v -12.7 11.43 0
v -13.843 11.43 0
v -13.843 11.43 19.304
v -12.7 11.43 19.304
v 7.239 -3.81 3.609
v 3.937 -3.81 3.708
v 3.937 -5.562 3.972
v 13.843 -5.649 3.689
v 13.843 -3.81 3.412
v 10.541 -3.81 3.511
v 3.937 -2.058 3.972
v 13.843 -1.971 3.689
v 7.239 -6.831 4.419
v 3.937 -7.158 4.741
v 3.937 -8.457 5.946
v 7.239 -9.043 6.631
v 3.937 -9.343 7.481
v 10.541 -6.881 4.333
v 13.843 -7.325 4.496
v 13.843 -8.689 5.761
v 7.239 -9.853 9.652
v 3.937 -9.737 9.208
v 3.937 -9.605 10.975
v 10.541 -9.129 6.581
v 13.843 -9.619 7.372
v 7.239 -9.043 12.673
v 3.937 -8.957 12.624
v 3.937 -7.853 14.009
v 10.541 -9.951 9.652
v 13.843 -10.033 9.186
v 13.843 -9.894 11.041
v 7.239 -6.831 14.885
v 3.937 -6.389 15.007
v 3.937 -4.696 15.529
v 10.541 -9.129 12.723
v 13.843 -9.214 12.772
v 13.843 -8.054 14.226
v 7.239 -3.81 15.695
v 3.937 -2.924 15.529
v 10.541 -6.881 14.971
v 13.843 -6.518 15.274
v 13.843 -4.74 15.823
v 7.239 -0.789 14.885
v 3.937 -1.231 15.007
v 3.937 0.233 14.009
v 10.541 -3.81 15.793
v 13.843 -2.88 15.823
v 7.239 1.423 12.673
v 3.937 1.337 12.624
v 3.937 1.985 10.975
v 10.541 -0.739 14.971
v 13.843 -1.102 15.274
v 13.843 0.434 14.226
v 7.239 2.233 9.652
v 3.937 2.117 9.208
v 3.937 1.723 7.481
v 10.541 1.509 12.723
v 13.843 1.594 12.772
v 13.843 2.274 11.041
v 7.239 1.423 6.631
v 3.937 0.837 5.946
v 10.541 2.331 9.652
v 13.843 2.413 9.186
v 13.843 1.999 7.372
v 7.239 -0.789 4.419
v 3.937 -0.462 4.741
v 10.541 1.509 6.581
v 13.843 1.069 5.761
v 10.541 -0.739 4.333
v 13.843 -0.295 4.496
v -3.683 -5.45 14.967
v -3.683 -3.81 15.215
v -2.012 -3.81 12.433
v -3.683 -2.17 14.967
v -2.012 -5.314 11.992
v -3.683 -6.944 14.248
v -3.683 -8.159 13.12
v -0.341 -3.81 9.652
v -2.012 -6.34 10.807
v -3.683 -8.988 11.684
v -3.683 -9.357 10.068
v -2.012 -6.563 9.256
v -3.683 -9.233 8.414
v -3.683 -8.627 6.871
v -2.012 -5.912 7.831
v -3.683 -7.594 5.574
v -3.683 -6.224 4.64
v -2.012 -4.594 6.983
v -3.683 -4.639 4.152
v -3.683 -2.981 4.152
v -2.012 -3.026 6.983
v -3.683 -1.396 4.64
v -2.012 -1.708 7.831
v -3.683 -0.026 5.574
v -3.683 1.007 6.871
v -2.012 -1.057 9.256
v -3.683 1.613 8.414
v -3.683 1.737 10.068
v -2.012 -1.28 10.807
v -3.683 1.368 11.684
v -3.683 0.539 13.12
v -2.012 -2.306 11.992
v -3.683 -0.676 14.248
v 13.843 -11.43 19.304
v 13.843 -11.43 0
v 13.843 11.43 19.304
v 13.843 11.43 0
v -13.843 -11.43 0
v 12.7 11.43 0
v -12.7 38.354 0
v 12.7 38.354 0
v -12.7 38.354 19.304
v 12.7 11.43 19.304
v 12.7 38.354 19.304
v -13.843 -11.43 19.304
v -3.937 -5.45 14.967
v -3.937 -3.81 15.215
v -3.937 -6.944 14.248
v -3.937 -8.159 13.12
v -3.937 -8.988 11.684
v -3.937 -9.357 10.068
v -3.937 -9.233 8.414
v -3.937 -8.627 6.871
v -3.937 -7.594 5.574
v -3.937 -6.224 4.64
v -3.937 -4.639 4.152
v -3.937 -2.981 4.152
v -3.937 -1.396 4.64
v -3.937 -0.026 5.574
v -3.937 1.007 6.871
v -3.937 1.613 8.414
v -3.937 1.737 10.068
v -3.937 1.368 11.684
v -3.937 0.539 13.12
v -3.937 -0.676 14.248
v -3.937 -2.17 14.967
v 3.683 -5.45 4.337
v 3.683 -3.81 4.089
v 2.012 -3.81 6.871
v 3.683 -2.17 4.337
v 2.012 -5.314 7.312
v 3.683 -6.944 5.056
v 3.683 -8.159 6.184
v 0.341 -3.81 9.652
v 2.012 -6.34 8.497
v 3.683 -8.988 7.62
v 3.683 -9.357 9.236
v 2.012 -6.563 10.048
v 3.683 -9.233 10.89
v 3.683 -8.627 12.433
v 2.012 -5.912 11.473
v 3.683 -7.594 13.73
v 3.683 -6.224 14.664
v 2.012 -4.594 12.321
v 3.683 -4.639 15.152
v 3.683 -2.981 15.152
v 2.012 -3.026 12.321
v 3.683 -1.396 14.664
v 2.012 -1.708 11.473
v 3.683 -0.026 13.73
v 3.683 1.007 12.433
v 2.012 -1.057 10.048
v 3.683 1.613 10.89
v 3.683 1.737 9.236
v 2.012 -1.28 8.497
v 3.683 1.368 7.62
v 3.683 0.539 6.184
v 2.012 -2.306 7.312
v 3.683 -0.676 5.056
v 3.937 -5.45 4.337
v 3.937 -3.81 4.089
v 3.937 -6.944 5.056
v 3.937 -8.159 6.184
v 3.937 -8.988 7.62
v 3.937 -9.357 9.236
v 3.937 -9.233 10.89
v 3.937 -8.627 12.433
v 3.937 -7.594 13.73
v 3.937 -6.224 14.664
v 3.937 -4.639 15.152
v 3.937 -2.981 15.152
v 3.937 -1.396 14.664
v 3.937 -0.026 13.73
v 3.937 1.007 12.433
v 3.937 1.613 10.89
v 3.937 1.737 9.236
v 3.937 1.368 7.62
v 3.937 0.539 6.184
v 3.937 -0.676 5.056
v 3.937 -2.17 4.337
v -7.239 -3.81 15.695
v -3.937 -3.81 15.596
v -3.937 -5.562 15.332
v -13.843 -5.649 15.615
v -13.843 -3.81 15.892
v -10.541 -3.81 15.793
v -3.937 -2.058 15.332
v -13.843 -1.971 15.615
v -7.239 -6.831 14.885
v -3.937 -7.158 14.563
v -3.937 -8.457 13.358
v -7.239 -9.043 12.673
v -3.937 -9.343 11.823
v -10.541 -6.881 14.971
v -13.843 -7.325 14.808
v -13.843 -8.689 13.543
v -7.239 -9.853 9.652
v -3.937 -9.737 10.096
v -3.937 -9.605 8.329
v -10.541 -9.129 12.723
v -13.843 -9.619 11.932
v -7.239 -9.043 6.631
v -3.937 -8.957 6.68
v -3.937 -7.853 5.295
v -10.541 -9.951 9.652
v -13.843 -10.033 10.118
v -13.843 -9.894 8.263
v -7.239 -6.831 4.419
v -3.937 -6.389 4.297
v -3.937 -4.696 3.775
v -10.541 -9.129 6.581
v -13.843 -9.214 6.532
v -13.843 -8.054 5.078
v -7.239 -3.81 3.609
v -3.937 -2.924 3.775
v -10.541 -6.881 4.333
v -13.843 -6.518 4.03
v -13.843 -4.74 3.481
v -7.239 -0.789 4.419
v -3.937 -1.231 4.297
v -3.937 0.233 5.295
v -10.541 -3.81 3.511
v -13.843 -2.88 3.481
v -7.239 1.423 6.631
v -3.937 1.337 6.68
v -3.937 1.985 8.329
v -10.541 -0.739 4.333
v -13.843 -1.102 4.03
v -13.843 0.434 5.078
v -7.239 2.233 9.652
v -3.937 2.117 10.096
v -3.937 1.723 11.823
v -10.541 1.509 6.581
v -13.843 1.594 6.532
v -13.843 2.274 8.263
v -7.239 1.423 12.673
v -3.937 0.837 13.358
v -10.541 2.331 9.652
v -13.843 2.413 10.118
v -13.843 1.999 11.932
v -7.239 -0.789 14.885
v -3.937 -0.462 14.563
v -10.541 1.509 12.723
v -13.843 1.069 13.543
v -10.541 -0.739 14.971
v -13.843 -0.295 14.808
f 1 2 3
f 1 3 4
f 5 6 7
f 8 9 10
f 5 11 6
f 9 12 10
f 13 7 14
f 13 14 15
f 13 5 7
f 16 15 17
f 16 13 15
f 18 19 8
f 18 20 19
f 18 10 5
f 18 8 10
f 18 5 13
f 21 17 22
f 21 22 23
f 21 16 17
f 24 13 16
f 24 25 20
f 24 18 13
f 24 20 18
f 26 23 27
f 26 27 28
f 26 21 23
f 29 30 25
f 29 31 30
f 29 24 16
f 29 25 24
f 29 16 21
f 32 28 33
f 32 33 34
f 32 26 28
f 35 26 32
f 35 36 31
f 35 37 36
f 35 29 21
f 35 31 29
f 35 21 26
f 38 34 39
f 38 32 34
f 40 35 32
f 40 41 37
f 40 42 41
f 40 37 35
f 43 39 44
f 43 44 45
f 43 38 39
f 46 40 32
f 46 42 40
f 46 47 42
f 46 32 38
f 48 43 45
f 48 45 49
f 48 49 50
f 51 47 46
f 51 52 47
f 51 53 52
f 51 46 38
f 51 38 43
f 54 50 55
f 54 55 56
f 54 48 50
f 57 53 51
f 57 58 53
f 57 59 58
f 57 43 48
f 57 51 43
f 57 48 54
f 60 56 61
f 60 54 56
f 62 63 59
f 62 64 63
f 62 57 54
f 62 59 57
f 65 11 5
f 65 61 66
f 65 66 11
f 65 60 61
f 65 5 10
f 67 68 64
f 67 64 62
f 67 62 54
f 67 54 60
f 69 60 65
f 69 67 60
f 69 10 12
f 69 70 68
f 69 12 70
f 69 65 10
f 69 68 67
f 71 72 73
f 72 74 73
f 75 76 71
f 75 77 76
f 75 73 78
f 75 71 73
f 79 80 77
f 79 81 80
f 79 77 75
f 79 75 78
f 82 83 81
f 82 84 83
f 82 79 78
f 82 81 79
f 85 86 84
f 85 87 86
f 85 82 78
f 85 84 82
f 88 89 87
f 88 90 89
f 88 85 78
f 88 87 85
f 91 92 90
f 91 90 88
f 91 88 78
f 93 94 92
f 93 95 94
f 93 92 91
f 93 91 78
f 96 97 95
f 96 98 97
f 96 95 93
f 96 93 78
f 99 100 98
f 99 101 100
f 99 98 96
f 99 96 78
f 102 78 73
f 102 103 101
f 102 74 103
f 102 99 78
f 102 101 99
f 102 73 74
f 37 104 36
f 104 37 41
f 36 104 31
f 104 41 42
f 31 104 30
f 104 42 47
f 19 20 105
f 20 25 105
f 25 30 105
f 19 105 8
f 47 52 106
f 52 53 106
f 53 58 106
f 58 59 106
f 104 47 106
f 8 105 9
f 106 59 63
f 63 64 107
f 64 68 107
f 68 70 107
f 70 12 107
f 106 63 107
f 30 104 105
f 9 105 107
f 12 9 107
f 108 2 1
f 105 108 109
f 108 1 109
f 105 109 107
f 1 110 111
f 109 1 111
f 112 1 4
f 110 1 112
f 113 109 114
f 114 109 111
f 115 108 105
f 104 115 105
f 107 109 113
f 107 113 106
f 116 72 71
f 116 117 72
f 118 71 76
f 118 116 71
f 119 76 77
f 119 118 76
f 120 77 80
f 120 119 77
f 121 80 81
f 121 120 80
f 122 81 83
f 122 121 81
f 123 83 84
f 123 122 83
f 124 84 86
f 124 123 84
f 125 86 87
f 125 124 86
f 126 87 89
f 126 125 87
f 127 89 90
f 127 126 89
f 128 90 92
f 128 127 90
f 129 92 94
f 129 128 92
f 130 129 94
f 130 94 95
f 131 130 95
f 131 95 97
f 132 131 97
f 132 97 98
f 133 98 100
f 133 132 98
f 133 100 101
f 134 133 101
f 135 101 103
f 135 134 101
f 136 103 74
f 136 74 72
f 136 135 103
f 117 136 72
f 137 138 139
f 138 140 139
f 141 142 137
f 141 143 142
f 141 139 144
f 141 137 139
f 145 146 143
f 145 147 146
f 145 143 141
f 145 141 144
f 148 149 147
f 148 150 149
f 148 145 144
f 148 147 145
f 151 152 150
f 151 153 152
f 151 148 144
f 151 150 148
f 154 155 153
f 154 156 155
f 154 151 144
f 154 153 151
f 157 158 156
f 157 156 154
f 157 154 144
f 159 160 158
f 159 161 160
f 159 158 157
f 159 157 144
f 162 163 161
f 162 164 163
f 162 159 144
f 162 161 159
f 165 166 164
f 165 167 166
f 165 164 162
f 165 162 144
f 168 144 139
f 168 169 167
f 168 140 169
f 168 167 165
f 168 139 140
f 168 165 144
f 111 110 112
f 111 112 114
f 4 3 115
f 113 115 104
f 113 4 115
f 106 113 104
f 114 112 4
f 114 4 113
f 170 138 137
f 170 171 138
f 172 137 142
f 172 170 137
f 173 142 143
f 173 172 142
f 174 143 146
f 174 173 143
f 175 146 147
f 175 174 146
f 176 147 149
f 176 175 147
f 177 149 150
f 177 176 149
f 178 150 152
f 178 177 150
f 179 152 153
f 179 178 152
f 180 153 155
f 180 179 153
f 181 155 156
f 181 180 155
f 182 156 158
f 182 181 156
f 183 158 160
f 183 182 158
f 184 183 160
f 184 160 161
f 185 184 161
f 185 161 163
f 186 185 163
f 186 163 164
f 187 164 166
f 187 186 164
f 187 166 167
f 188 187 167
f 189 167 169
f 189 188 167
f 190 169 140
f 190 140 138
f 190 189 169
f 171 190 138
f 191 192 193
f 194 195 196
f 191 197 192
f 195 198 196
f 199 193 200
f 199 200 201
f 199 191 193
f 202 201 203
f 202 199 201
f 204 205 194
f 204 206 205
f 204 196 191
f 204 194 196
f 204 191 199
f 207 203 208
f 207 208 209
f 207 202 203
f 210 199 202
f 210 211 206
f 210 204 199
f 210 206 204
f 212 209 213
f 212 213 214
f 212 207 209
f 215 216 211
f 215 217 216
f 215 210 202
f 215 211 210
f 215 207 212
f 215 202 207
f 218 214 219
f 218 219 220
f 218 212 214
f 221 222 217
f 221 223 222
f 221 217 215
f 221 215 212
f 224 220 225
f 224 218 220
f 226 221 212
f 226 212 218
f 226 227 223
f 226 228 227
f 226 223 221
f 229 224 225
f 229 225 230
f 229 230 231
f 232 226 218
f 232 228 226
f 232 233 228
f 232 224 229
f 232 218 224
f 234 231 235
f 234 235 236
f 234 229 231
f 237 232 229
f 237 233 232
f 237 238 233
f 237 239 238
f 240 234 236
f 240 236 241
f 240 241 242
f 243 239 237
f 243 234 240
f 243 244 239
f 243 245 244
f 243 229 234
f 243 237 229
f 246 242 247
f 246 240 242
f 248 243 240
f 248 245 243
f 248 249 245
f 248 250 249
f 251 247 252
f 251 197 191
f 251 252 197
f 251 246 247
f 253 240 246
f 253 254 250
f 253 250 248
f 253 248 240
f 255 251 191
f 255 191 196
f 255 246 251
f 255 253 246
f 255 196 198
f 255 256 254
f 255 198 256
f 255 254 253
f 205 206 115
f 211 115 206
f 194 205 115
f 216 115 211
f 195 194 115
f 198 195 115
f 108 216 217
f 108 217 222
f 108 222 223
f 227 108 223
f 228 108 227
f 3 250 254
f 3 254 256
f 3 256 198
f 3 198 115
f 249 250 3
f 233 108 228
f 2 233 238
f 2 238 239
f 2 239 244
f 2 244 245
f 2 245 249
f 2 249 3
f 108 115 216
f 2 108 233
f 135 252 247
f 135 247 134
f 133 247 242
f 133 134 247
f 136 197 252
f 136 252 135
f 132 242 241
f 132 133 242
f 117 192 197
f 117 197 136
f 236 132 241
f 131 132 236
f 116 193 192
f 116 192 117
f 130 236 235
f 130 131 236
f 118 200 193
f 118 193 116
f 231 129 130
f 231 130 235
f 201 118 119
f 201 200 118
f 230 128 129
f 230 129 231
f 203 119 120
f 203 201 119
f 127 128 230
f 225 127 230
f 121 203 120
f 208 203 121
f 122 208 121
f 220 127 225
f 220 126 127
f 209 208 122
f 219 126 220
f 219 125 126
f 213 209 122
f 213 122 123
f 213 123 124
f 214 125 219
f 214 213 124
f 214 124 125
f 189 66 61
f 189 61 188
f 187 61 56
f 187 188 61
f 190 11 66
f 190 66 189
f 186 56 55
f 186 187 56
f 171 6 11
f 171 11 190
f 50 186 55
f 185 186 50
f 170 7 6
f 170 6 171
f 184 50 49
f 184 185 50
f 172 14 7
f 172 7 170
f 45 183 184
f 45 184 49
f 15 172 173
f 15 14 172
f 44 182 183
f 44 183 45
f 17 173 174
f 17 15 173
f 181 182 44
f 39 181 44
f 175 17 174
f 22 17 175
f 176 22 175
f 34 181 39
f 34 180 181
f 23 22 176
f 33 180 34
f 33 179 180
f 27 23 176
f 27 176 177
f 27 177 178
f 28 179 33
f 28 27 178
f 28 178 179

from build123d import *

# Parameters (mm, degrees)
SKETCH1_W           = 27.686
SKETCH1_H           = 22.86
SKETCH1_W_2         = 25.4
SKETCH1_H_2         = 26.924
BOSS_EXTRUDE1_DEPTH = 19.304


with BuildPart() as part:
    # Sketch1 → Boss-Extrude1 (new body)
    with BuildSketch(Plane.XY):
        Rectangle(SKETCH1_W, SKETCH1_H)
        with Locations((0, 24.892)):
            Rectangle(SKETCH1_W_2, SKETCH1_H_2)
    extrude(amount=BOSS_EXTRUDE1_DEPTH)

    # Sketch3 → 1/4 NPT Tapped Hole1 (revolve, cut)
    with BuildSketch(Plane(origin=(13.843, -3.81, 9.652), x_dir=(0, 0, -1), z_dir=(0, 1, 0))):
        Polygon((0, 0), (0, 13.502347279), (5.5626, 10.16), (5.5626, 9.906), (5.943685794, 9.906), (6.2402847, 0), align=None)
    revolve(axis=Axis((20.193, -3.81, 9.652), (-1, 0, 0)), mode=Mode.SUBTRACT)

    # Sketch4 → 1/4 NPT Tapped Hole2 (revolve, cut)
    with BuildSketch(Plane(origin=(-13.843, -3.81, 9.652), x_dir=(0, 0, 1), z_dir=(0, 1, 0))):
        Polygon((0, 0), (0, 13.502347279), (5.5626, 10.16), (5.5626, 9.906), (5.943685794, 9.906), (6.2402847, 0), align=None)
    revolve(axis=Axis((-20.193, -3.81, 9.652), (1, 0, 0)), mode=Mode.SUBTRACT)


solid = part.part
